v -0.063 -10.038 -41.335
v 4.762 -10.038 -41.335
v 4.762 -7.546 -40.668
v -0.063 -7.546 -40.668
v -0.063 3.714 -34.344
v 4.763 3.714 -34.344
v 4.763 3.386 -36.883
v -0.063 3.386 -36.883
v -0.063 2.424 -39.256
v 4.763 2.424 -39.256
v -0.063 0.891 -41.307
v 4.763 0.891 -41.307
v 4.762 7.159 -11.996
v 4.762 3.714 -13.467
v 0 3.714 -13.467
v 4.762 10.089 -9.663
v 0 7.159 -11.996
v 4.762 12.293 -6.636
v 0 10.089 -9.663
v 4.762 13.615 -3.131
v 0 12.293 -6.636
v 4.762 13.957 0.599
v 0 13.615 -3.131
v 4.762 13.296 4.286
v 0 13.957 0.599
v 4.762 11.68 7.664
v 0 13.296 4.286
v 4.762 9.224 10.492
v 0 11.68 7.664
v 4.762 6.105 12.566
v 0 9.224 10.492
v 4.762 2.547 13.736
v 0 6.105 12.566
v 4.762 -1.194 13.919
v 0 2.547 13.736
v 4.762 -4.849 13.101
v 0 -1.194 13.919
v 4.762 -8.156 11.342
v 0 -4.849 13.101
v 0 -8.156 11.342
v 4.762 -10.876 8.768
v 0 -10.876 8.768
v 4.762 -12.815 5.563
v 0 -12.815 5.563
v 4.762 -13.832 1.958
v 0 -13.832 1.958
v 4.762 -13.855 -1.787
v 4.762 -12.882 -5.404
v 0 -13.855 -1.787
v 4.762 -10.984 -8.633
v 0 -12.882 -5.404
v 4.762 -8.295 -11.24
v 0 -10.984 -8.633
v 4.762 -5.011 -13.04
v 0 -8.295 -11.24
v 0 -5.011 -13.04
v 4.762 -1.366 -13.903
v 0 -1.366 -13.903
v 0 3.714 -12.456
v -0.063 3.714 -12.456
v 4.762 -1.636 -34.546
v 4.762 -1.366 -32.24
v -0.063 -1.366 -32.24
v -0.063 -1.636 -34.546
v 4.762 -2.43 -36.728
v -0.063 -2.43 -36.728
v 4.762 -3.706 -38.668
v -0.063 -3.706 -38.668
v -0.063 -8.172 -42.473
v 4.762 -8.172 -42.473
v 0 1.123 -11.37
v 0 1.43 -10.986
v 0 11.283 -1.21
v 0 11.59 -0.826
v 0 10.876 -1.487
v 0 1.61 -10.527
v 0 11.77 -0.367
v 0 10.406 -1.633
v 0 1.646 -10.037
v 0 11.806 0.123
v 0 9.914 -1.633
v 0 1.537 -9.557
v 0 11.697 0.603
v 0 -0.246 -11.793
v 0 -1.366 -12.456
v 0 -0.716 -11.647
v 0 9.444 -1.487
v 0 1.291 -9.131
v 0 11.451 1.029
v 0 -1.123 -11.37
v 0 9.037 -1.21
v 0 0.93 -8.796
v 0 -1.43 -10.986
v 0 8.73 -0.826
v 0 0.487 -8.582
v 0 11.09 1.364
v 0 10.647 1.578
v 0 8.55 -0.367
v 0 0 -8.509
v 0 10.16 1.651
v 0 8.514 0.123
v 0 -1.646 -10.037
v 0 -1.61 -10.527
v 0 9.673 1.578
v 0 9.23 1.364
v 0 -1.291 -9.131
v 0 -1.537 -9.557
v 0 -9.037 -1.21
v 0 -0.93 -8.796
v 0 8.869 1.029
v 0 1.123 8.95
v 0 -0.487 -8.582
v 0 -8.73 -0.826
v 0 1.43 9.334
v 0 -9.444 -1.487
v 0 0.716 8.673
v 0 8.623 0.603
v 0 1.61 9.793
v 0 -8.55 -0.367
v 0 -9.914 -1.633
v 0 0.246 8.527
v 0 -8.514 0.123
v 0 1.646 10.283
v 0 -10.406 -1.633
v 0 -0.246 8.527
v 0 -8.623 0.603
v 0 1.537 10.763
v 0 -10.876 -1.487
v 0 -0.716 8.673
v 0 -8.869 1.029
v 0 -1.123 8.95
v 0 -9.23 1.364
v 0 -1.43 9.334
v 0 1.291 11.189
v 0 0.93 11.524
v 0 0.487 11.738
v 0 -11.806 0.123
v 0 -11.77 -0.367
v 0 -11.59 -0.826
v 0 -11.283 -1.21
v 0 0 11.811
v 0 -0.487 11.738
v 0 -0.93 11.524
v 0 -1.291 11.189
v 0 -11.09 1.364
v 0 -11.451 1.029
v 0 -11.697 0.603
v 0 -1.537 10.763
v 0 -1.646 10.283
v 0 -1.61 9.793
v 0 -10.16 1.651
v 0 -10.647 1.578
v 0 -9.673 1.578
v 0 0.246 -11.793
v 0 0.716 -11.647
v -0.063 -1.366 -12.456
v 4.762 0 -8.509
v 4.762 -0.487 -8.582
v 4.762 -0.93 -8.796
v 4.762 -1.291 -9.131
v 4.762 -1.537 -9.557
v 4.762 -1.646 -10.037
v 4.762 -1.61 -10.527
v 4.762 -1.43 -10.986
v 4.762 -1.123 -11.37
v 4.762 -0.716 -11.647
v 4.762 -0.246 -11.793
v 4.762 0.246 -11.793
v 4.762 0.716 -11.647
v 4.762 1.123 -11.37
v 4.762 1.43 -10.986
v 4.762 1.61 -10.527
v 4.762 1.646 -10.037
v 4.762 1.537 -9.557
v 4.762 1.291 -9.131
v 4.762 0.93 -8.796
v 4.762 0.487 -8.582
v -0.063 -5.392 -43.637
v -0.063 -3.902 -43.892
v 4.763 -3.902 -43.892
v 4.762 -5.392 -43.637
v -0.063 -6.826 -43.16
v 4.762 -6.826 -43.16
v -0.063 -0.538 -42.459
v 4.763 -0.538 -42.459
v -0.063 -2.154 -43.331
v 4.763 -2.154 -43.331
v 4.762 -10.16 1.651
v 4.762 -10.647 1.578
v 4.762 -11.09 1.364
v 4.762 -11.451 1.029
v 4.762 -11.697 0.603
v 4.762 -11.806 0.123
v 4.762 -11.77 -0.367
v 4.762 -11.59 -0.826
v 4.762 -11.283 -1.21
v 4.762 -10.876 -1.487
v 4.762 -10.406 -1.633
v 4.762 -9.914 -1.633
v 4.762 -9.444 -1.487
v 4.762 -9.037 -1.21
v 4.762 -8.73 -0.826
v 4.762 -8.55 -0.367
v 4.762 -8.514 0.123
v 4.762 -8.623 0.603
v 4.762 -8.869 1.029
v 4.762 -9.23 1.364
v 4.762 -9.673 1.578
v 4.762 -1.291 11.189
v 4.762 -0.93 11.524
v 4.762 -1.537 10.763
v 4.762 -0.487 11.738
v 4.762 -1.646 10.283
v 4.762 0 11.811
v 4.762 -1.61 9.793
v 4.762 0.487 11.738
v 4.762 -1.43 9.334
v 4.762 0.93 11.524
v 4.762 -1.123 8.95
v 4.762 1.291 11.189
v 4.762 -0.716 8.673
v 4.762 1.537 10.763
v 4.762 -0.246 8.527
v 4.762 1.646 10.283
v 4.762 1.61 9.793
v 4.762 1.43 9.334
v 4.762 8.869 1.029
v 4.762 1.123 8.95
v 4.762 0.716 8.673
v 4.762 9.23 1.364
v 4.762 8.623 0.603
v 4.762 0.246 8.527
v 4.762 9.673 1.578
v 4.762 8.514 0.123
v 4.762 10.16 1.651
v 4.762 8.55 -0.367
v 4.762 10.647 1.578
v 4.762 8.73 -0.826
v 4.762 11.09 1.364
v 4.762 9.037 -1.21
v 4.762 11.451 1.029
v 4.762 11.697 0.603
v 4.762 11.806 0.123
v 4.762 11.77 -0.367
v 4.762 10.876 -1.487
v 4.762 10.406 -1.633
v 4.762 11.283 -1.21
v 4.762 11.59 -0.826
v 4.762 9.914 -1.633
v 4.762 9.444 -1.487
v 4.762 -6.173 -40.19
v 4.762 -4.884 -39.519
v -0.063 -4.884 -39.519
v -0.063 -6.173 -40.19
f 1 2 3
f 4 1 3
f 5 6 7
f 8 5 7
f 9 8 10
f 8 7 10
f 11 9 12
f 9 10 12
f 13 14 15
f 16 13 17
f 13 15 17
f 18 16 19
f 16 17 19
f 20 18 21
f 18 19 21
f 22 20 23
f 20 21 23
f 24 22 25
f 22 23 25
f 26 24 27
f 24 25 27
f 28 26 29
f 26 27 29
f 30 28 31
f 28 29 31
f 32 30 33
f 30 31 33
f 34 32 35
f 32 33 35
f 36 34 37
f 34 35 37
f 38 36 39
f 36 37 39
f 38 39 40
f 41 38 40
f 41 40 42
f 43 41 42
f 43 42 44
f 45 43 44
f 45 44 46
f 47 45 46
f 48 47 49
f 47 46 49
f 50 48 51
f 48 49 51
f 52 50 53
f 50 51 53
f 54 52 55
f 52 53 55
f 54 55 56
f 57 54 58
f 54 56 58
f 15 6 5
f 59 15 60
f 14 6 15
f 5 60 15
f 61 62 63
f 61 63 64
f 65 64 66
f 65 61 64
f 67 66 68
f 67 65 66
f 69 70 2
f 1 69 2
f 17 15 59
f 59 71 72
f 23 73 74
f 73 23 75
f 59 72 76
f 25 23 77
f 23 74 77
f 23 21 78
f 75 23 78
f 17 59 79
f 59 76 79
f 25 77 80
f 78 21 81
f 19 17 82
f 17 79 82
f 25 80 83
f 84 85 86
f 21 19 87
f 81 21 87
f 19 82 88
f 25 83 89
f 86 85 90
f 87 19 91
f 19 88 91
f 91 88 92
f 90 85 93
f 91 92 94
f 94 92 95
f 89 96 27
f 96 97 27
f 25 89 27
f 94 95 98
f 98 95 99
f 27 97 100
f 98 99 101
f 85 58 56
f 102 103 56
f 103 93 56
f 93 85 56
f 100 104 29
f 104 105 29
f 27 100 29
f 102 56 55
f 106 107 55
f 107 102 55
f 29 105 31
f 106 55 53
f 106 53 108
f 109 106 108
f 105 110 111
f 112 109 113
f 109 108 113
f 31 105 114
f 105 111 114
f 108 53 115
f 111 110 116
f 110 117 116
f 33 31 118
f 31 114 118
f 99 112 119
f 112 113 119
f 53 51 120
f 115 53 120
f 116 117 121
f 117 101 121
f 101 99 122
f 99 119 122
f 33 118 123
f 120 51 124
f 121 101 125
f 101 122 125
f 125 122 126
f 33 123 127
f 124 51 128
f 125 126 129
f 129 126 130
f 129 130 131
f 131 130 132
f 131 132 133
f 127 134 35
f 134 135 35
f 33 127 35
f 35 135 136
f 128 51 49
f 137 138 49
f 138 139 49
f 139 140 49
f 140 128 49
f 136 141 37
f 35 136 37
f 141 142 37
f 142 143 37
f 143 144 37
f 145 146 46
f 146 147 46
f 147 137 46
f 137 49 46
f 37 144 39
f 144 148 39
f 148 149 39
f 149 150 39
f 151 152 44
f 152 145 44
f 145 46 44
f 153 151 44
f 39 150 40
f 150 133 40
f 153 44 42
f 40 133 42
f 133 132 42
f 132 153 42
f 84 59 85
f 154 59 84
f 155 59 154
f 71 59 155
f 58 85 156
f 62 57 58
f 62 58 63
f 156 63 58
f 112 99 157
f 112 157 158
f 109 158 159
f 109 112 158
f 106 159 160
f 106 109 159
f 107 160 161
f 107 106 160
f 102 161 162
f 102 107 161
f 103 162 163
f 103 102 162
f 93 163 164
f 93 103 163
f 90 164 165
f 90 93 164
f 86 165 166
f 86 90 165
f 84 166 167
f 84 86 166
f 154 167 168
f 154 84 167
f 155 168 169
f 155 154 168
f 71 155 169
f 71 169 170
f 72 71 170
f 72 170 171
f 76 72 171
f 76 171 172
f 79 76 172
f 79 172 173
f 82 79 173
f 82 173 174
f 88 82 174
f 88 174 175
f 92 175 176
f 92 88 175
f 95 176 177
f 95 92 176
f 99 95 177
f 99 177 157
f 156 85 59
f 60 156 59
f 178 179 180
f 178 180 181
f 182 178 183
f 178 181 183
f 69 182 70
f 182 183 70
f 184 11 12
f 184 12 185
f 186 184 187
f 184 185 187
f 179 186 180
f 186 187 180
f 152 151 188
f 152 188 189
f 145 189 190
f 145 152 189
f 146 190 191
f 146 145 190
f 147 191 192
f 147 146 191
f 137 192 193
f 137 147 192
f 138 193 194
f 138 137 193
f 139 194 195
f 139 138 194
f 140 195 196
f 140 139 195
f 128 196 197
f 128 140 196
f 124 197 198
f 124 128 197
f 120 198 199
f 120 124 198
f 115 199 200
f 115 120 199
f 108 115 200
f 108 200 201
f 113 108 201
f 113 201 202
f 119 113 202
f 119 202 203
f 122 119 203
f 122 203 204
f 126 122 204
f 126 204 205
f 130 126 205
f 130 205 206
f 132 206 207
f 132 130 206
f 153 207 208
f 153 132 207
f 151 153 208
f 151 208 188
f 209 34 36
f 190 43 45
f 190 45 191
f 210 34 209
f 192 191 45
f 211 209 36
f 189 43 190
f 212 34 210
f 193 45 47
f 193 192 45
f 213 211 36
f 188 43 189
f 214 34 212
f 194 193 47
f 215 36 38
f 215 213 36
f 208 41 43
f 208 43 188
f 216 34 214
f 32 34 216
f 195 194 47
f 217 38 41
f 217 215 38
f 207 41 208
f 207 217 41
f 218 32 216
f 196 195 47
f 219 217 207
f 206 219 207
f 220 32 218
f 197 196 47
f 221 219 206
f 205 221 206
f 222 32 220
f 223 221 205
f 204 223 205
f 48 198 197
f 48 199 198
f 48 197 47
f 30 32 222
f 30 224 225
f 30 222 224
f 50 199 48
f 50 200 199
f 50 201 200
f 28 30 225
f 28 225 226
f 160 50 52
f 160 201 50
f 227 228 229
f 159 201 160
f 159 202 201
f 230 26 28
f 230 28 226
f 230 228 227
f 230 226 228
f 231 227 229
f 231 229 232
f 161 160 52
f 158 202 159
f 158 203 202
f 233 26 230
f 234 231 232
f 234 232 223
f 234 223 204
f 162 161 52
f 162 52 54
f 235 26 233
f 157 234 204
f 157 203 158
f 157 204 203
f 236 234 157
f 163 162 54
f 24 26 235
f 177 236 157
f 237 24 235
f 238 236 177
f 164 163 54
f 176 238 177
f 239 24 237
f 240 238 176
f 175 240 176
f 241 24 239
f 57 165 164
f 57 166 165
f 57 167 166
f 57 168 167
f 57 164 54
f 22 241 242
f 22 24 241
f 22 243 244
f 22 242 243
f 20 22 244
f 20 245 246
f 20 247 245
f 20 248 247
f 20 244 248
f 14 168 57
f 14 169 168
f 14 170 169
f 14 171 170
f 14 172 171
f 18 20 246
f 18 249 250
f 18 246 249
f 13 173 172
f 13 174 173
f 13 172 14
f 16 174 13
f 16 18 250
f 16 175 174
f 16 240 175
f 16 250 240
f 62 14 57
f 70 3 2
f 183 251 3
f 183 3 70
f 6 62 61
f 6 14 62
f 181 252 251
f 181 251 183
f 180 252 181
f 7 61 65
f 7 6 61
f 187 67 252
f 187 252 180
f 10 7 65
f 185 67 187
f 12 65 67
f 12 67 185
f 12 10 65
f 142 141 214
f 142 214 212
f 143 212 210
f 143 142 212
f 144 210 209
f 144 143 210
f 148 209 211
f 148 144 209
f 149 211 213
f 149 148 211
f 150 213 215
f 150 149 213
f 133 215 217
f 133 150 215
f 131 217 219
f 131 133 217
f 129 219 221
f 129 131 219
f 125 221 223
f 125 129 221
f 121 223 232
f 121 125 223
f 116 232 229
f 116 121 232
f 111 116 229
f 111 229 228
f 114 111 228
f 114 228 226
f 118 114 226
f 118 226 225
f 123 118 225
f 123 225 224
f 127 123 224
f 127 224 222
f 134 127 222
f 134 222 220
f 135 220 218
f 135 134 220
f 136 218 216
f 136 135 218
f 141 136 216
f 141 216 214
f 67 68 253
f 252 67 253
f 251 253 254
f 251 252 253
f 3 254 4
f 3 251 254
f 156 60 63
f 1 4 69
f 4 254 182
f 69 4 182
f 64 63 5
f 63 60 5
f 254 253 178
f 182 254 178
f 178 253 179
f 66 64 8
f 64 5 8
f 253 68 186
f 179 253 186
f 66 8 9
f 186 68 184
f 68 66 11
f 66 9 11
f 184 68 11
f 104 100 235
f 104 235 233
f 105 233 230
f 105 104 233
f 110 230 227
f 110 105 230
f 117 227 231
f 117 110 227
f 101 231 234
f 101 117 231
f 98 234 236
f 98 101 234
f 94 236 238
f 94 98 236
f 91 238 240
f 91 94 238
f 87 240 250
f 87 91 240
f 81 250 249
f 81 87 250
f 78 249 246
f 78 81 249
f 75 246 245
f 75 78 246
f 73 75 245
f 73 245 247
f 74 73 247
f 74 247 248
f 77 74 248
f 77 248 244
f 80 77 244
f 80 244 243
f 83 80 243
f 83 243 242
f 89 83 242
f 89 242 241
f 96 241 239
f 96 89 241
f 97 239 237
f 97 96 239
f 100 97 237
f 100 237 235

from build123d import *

# Parameters (mm, degrees)
SKETCH1_R           = 13.97
SKETCH1_R_2         = 1.651
BOSS_EXTRUDE1_DEPTH = 4.7625
LEG1_DEPTH          = 4.826
FILLET2_R           = 10


with BuildPart() as part:
    # Sketch1 → Boss-Extrude1 (new body)
    with BuildSketch(Plane(origin=(0, 0, 0), x_dir=(0, 0, -1), z_dir=(1, 0, 0))):
        with Locations(Location((0, 0, 0), (0, 0, 180))):
            Circle(SKETCH1_R)
        with Locations(Location((-10.16, 0, 0), (0, 0, 180))):
            Circle(SKETCH1_R_2, mode=Mode.SUBTRACT)
        with Locations(Location((0, 10.16, 0), (0, 0, 180))):
            Circle(SKETCH1_R_2, mode=Mode.SUBTRACT)
        with Locations(Location((10.16, 0, 0), (0, 0, 180))):
            Circle(SKETCH1_R_2, mode=Mode.SUBTRACT)
        with Locations(Location((0, -10.16, 0), (0, 0, 180))):
            Circle(SKETCH1_R_2, mode=Mode.SUBTRACT)
    extrude(amount=BOSS_EXTRUDE1_DEPTH)

    # Sketch2 → leg1 (add)
    with BuildSketch(Plane(origin=(4.7625, 0, 0), x_dir=(0, 0, -1), z_dir=(1, 0, 0))):
        Polygon((13.467260192, 3.714000931), (38.486260192, 3.714000931), (43.874413865, -1.674152741), (44.112587658, -5.484152741), (41.335339641, -10.038101517), (39.974157744, -4.958101517), (36.382055295, -1.365999069), (13.903055295, -1.365999069), (12.45646463, -1.365999069), (12.45646463, 3.714000931), align=None)
    extrude(amount=-LEG1_DEPTH)

    # Fillet2
    # the kernel refuses this fillet: 10 mm, written as the material it adds along each edge
    with BuildSketch(Plane(origin=(4.7625, -4.958101517, -39.974157744), x_dir=(0, 0.7071067811865493, 0.7071067811865457), z_dir=(-1, 0, 0))) as fillet2_piece_1:
        with BuildLine():
            CenterArc((FILLET2_R * 0.267949192431, -FILLET2_R), FILLET2_R, 90, 30)
            Line((-FILLET2_R * 0.232050807569, -FILLET2_R * 0.133974596216), (0, 0))
            Line((0, 0), (FILLET2_R * 0.267949192431, 0))
        make_face()
    extrude(amount=4.826)
    with BuildSketch(Plane(origin=(4.7625, -1.365999069, -36.382055295), x_dir=(0, 0, 1), z_dir=(-1, 0, 0))) as fillet2_piece_2:
        with BuildLine():
            CenterArc((FILLET2_R * 0.414213562373, -FILLET2_R), FILLET2_R, 90, 45)
            Line((-FILLET2_R * 0.292893218813, -FILLET2_R * 0.292893218813), (0, 0))
            Line((0, 0), (FILLET2_R * 0.414213562373, 0))
        make_face()
    extrude(amount=4.826)
    # the kernel refuses this fillet: 10 mm, written as the material it takes off along each edge
    with BuildSketch(Plane(origin=(15.117839059, 3.714000931, -38.486260192), x_dir=(0, 0, 1), z_dir=(-1, 0, 0))) as fillet2_2_piece_1:
        with BuildLine():
            CenterArc((FILLET2_R * 0.414213562373, -FILLET2_R), FILLET2_R, 90, 45)
            Line((-FILLET2_R * 0.292893218813, -FILLET2_R * 0.292893218813), (0, 0))
            Line((0, 0), (FILLET2_R * 0.414213562373, 0))
        make_face()
    extrude(amount=25.536678119, mode=Mode.SUBTRACT)
    with BuildSketch(Plane(origin=(14.214931239, -1.674152741, -43.874413865), x_dir=(0, 0.707106781186548, 0.707106781186547), z_dir=(-1, 0, 0))) as fillet2_2_piece_2:
        with BuildLine():
            CenterArc((FILLET2_R * 0.378097249561, -FILLET2_R), FILLET2_R, 90, 41.422934713)
            Line((-FILLET2_R * 0.283514821921, -FILLET2_R * 0.250153704503), (0, 0))
            Line((0, 0), (FILLET2_R * 0.378097249561, 0))
        make_face()
    extrude(amount=23.730862478, mode=Mode.SUBTRACT)
    with BuildSketch(Plane(origin=(12.633985106, -5.484152741, -44.112587658), x_dir=(0, -0.853758675625452, 0.5206689195585562), z_dir=(-1, 0, 0))) as fillet2_2_piece_3:
        with BuildLine():
            CenterArc((FILLET2_R * 0.314859404258, FILLET2_R), FILLET2_R, 235.045802712, 34.954197288)
            Line((-FILLET2_R * 0.258062012092, FILLET2_R * 0.180389695839), (0, 0))
            Line((0, 0), (FILLET2_R * 0.314859404258, 0))
        make_face()
    extrude(amount=20.568970213, mode=Mode.SUBTRACT)


solid = part.part
